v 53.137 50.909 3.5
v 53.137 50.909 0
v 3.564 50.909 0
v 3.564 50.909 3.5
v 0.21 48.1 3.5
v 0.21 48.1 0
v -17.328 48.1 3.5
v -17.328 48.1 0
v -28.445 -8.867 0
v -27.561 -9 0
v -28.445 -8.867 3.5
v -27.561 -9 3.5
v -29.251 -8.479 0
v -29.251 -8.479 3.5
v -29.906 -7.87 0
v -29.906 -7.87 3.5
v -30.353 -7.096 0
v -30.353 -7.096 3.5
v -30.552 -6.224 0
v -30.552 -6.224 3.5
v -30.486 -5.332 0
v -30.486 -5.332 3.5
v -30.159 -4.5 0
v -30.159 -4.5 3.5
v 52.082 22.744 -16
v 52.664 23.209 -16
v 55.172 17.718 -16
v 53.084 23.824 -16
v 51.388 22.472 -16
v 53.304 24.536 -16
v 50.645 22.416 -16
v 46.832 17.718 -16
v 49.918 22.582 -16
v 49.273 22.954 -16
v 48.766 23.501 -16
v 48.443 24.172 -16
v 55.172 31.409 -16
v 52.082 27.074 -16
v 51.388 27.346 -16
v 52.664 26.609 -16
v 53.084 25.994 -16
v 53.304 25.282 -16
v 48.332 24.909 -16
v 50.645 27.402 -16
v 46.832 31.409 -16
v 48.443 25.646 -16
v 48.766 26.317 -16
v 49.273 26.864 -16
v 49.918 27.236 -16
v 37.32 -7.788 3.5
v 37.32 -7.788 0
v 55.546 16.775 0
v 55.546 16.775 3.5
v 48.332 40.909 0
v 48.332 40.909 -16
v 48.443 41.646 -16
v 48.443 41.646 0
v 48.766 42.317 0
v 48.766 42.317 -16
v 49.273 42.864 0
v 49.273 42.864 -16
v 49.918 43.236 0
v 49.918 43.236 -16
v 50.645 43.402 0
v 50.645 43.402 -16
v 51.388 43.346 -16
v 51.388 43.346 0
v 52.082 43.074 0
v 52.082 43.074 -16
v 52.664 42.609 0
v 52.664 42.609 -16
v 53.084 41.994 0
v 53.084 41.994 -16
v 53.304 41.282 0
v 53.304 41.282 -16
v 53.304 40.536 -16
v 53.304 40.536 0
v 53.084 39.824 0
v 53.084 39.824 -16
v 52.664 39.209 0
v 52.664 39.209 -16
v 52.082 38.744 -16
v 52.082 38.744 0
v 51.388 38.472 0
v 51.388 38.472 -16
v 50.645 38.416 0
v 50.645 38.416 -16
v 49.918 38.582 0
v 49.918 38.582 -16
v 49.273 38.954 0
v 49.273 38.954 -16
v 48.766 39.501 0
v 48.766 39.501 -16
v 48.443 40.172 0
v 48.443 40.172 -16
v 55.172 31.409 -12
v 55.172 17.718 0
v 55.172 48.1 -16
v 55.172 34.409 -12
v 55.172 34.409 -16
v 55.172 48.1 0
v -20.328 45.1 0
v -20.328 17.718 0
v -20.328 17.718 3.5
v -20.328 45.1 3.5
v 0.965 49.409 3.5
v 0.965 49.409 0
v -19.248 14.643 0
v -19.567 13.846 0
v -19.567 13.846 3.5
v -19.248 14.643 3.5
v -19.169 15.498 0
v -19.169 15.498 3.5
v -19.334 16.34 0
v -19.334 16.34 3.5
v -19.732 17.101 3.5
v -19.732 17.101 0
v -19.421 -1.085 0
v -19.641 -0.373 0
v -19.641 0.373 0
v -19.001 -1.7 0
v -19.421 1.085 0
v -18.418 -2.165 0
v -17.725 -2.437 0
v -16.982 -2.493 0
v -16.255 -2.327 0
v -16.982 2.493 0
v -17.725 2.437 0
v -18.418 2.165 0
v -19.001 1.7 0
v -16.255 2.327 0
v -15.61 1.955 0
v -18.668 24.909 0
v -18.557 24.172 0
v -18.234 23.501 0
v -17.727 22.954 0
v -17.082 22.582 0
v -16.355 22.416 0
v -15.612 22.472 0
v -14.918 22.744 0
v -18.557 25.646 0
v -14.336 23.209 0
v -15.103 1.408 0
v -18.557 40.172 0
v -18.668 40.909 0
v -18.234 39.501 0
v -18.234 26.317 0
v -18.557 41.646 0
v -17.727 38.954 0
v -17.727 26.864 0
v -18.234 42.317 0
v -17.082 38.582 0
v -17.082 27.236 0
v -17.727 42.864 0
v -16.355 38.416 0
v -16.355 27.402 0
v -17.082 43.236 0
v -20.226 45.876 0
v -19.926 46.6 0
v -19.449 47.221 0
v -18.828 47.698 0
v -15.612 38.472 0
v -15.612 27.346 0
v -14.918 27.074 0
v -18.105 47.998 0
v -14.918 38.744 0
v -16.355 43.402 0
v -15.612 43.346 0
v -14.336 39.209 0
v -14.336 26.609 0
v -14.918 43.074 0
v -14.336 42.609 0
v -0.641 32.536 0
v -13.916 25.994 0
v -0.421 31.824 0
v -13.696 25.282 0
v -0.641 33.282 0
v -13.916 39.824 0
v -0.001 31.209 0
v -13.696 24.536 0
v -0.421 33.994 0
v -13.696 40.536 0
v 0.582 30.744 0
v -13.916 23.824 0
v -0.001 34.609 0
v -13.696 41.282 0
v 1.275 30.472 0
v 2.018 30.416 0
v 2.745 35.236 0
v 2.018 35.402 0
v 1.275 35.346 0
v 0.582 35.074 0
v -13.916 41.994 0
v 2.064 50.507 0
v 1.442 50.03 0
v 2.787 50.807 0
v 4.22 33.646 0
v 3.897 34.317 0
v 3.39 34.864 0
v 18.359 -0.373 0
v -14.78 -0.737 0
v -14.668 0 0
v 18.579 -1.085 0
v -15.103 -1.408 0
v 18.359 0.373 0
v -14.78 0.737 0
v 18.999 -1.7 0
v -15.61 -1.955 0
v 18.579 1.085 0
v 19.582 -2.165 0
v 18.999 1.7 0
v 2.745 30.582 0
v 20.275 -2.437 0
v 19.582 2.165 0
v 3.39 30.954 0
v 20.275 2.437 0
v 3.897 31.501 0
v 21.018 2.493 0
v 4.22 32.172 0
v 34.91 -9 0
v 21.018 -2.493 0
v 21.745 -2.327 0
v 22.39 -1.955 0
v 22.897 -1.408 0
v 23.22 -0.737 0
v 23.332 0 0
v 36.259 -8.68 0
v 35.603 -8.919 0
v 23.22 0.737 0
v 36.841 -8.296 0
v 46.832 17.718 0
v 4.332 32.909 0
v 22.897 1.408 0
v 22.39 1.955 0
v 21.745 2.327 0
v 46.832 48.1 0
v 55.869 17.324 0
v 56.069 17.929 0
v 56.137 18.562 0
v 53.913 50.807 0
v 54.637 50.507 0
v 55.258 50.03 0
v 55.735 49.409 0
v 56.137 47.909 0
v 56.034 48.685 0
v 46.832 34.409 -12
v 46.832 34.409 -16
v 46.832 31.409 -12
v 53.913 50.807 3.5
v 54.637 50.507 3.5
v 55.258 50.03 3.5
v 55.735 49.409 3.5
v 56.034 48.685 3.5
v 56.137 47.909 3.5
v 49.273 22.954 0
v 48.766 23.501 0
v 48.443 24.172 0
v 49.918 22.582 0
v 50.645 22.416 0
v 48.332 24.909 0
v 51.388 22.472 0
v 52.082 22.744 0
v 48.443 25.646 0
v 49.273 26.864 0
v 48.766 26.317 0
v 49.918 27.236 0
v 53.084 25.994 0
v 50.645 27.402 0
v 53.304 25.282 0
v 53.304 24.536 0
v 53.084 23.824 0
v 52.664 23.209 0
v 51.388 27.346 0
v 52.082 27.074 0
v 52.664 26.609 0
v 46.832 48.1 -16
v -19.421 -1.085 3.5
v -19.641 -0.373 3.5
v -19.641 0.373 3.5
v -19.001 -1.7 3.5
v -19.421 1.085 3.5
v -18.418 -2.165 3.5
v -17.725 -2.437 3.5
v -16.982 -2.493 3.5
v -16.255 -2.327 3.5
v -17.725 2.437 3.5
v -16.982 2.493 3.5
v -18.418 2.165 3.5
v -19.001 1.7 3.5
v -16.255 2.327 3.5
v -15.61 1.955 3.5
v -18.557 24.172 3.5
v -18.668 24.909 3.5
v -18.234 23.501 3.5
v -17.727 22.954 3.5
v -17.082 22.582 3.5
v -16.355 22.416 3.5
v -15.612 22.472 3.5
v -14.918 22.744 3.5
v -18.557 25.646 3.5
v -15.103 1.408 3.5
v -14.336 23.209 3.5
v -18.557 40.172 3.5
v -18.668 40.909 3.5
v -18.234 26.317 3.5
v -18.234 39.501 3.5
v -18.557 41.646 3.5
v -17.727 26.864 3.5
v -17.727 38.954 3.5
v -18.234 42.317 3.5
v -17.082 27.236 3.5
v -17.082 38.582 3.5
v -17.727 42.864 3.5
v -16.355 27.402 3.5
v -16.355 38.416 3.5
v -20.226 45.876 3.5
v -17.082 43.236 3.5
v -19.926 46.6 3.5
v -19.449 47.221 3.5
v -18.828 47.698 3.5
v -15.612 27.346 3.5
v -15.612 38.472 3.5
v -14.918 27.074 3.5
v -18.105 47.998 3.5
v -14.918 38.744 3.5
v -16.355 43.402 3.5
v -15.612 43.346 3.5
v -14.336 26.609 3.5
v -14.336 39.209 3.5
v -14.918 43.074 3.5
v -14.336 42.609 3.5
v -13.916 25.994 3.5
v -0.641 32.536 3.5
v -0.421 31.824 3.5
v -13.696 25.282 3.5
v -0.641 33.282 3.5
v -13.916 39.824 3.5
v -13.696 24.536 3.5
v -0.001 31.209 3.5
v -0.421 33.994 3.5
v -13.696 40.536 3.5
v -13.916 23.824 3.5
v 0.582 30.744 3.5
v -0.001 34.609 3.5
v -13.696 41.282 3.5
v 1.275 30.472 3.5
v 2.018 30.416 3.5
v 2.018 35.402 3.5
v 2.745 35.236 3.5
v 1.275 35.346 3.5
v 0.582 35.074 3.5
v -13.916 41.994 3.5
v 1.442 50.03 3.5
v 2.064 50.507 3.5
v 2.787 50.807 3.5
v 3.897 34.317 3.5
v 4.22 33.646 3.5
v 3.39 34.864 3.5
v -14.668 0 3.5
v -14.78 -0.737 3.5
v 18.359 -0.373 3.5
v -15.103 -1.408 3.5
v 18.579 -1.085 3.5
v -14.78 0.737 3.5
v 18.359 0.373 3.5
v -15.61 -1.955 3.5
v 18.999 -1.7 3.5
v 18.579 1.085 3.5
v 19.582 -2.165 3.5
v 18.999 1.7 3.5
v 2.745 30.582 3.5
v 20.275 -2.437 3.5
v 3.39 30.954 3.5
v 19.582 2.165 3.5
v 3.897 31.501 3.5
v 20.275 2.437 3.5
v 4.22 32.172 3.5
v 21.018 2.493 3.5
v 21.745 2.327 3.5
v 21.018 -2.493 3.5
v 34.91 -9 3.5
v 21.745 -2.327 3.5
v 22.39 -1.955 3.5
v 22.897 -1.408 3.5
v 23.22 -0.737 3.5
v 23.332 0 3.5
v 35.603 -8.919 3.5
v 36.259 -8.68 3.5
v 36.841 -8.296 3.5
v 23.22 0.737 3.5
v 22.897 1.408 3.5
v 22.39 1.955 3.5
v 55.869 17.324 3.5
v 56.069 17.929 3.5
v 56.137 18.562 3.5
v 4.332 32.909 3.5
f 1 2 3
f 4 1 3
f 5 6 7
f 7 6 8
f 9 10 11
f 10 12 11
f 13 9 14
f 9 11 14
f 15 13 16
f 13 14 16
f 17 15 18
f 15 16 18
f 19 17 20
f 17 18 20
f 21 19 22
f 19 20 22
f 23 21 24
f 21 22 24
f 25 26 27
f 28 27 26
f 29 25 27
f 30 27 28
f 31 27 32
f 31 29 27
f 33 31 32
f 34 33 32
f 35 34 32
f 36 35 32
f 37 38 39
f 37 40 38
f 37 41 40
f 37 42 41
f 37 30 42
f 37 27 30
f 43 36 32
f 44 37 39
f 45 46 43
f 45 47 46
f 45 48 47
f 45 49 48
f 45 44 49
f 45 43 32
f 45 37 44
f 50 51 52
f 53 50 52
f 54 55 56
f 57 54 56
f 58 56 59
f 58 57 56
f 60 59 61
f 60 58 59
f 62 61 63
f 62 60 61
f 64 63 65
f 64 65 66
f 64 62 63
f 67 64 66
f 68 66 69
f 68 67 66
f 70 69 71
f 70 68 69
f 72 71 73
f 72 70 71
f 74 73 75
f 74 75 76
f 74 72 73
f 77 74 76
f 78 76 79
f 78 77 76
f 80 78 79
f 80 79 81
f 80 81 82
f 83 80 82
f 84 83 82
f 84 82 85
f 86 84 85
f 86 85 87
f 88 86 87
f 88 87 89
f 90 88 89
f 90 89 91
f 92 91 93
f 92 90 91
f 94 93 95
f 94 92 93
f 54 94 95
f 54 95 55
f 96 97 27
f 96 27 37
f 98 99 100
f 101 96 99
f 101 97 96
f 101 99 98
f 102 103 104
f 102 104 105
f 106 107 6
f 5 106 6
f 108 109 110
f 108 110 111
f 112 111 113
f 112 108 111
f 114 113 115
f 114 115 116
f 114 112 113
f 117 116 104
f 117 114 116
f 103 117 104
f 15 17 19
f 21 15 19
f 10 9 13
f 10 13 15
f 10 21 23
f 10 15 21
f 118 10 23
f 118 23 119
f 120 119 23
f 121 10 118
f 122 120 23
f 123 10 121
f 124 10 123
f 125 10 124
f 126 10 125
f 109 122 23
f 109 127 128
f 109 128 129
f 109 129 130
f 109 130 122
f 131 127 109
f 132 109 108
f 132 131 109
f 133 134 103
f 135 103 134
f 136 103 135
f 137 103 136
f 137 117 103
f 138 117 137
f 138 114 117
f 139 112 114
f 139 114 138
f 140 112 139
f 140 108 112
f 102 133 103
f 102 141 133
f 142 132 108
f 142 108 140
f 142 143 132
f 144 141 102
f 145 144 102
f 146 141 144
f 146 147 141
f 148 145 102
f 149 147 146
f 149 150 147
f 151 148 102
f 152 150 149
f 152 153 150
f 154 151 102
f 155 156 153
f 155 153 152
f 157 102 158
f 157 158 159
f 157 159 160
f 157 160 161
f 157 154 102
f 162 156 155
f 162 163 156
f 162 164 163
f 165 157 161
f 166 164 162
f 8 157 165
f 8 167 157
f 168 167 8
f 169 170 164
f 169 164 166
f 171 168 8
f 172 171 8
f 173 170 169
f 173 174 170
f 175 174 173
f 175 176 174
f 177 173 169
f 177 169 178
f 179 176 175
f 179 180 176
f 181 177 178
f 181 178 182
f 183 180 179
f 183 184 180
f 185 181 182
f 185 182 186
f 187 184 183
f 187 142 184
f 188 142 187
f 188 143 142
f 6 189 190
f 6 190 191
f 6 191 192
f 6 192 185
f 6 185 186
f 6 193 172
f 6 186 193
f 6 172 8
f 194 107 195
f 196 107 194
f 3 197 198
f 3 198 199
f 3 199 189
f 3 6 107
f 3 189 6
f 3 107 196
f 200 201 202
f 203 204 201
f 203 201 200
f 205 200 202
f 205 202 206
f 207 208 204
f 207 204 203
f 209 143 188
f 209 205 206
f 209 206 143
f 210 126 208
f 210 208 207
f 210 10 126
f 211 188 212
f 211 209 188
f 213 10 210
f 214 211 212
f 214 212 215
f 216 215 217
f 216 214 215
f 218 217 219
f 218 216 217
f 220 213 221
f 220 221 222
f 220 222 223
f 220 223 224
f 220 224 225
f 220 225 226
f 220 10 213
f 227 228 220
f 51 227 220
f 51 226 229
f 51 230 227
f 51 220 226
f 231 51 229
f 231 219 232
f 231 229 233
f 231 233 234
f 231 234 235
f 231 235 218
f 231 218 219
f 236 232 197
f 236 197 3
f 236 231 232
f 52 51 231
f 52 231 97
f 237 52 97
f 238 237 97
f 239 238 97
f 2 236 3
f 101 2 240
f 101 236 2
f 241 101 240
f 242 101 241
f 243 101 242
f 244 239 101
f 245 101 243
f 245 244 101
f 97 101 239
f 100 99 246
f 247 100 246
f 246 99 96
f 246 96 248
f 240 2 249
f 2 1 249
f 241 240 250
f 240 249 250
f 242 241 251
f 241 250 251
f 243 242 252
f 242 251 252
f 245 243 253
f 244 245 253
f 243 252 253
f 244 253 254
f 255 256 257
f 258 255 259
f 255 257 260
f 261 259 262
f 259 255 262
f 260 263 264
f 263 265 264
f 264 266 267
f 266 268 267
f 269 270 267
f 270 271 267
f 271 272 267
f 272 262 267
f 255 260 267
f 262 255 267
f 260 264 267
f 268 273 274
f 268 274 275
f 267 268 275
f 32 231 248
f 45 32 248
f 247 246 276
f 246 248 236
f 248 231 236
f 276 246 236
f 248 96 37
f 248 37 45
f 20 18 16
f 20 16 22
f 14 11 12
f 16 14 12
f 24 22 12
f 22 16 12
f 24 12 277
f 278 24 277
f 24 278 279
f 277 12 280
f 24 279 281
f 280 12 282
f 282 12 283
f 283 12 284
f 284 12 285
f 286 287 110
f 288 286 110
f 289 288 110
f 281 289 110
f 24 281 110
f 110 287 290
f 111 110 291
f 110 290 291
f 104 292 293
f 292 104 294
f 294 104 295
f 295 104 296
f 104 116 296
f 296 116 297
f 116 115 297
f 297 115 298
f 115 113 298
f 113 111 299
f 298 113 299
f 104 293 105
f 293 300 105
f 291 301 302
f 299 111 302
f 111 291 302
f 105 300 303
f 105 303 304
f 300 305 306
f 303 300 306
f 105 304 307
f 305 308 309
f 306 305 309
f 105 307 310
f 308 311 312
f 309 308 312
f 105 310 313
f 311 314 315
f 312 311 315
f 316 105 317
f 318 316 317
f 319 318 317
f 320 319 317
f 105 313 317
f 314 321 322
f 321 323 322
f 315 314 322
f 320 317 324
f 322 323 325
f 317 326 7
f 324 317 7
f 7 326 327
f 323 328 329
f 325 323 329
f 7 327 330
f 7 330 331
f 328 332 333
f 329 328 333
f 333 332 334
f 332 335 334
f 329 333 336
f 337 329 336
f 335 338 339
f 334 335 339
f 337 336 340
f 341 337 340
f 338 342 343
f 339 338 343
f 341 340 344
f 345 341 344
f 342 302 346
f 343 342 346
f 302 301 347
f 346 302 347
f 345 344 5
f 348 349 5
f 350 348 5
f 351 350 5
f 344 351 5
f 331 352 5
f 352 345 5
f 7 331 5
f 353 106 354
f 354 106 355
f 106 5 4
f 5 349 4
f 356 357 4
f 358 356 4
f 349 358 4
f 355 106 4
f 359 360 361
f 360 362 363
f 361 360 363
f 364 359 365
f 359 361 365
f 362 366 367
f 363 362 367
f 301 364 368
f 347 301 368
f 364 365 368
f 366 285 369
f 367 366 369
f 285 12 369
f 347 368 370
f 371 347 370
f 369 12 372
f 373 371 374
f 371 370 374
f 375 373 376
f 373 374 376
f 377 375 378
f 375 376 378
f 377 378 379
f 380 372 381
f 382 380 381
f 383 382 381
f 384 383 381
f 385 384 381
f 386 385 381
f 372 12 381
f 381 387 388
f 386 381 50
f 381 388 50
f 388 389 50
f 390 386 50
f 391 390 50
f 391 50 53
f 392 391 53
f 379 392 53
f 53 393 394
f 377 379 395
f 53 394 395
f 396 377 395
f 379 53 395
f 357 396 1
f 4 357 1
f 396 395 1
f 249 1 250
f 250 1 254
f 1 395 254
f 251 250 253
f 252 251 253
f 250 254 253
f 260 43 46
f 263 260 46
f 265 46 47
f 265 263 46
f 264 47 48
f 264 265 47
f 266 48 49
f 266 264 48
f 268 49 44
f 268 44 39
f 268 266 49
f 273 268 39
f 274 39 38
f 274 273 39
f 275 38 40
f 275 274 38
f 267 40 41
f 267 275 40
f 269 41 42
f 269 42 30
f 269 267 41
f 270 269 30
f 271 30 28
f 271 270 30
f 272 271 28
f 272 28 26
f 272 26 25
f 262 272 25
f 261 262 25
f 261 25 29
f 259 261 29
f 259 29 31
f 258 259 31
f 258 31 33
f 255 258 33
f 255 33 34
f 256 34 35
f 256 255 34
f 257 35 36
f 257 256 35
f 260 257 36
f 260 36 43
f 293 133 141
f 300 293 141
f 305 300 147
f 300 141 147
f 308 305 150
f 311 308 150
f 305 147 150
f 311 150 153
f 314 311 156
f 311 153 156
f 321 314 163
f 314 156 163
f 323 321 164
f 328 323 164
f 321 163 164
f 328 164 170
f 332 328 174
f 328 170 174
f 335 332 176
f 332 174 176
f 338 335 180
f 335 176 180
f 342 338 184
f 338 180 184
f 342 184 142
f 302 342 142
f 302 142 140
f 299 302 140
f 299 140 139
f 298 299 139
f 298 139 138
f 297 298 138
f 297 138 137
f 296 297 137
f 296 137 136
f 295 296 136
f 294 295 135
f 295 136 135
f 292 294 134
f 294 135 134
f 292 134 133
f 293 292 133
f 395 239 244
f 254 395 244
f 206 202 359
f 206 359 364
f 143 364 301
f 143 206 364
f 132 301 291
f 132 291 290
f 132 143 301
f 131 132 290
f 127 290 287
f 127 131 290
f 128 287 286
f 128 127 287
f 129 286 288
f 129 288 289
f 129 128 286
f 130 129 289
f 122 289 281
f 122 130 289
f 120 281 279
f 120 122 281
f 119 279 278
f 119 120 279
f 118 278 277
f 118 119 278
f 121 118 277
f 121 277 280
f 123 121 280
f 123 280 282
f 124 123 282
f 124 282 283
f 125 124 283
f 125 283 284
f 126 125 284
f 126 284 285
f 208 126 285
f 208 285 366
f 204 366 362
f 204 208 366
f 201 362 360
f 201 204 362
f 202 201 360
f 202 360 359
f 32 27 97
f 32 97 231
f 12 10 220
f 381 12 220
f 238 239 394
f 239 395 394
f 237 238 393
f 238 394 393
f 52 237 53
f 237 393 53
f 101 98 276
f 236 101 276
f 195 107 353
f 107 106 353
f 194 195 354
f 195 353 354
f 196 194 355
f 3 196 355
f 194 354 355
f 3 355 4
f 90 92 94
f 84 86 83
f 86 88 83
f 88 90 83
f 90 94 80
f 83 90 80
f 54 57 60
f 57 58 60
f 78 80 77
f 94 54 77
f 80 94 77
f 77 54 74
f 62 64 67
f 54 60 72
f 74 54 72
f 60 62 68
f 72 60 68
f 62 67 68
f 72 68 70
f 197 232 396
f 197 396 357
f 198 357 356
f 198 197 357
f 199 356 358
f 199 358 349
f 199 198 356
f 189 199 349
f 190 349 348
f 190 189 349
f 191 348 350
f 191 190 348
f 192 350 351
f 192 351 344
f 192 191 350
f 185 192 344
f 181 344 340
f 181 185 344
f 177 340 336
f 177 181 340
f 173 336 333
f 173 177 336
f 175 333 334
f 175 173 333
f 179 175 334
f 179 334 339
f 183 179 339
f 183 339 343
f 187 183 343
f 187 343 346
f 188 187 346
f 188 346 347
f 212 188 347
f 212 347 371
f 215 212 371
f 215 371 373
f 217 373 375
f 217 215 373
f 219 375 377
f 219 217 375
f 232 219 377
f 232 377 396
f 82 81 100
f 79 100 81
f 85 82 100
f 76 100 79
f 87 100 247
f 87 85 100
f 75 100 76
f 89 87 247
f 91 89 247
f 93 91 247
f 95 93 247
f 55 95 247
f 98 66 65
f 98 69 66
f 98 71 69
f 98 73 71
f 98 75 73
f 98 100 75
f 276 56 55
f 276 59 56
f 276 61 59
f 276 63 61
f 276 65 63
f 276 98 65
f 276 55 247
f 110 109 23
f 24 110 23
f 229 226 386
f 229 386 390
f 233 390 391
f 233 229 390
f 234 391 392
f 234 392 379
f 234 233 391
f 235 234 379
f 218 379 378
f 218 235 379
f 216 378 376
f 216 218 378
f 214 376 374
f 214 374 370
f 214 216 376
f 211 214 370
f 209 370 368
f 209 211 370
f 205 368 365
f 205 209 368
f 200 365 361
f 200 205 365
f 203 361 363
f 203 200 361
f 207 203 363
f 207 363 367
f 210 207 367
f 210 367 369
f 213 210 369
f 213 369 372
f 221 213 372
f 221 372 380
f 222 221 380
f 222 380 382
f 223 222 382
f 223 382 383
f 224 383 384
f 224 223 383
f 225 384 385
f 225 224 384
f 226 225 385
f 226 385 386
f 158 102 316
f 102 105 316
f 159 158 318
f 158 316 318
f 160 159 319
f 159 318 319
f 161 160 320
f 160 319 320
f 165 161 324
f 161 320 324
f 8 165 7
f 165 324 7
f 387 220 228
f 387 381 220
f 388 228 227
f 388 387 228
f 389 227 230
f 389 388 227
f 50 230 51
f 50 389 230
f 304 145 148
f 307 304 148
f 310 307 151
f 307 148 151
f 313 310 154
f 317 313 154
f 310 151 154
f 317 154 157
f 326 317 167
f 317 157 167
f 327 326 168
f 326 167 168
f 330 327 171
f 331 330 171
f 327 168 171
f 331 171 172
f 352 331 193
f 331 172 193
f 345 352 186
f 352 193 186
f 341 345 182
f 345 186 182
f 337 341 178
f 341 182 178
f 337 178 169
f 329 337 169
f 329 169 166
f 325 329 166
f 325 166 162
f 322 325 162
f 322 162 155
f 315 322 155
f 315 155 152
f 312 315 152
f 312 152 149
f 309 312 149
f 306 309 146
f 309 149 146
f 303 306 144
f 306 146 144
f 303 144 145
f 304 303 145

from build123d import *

# Parameters (mm, degrees)
SKETCH1_R           = 2.5
BOSS_EXTRUDE1_DEPTH = 3.5
FILLET1_R           = 3
SKETCH2_W           = 75.5
SKETCH2_H           = 30.382012963
SKETCH2_R           = 4.125
SKETCH2_R_2         = 2.5
BOSS_EXTRUDE2_DEPTH = 3.5
SKETCH2_4_W         = 8.340351234
SKETCH2_4_H         = 13.691006481
SKETCH2_4_R         = 2.5
SKETCH2_4_H_2       = 13.691006482
BOSS_EXTRUDE3_DEPTH = 16
FILLET2_R           = 3
FILLET3_R           = 3
SKETCH2_7_W         = 8.340351234
SKETCH2_7_H         = 3
BOSS_EXTRUDE5_DEPTH = 12


with BuildPart() as part:
    # Sketch1 → Boss-Extrude1 (new body)
    with BuildSketch(Plane.XY):
        Polygon((-32.756938656, -9), (36.41997588, -9), (56.136580269, 17.570938838), (56.136580269, 50.908965344), (1.831518612, 50.908965344), align=None)
        with Locations((-17.168481388, 0)):
            Circle(SKETCH1_R, mode=Mode.SUBTRACT)
        with Locations((20.831518612, 0)):
            Circle(SKETCH1_R, mode=Mode.SUBTRACT)
        with Locations((1.831518612, 32.908965344)):
            Circle(SKETCH1_R, mode=Mode.SUBTRACT)
    extrude(amount=BOSS_EXTRUDE1_DEPTH)

    # Fillet1
    fillet1_edges = [part.edges().sort_by_distance(p)[0] for p in [
        (36.41997588, -9, 1.75),
        (-32.756938656, -9, 1.75),
        (1.831518612, 50.908965344, 1.75),
    ]]
    fillet(fillet1_edges, radius=FILLET1_R)

    # Sketch2 → Boss-Extrude2 (add)
    with BuildSketch(Plane(origin=(0, 0, 0), x_dir=(-1, 0, 0), z_dir=(0, 0, -1))):
        with Locations((-17.421869846, 32.908965344)):
            Rectangle(SKETCH2_W, SKETCH2_H)
        with Locations((-1.831518612, 32.908965344)):
            Circle(SKETCH2_R, mode=Mode.SUBTRACT)
        with Locations((16.168481388, 40.908965344)):
            Circle(SKETCH2_R_2, mode=Mode.SUBTRACT)
        with Locations((16.168481388, 24.908965344)):
            Circle(SKETCH2_R_2, mode=Mode.SUBTRACT)
        with Locations((-50.831518612, 24.908965344)):
            Circle(SKETCH2_R_2, mode=Mode.SUBTRACT)
        with Locations((-50.831518612, 40.908965344)):
            Circle(SKETCH2_R_2, mode=Mode.SUBTRACT)
    extrude(amount=-BOSS_EXTRUDE2_DEPTH)

    # Sketch2<4> → Boss-Extrude3 (add)
    # profile 1 of 2: a face of its own
    with BuildSketch(Plane(origin=(0, 0, 0), x_dir=(-1, 0, 0), z_dir=(0, 0, -1))):
        with Locations((-51.001694229, 41.254468585)):
            Rectangle(SKETCH2_4_W, SKETCH2_4_H)
        with Locations((-50.831518612, 40.908965344)):
            Circle(SKETCH2_4_R, mode=Mode.SUBTRACT)
    # profile 2 of 2: a face of its own
    with BuildSketch(Plane(origin=(0, 0, 0), x_dir=(-1, 0, 0), z_dir=(0, 0, -1))):
        with Locations((-51.001694229, 24.563462103)):
            Rectangle(SKETCH2_4_W, SKETCH2_4_H_2)
        with Locations((-50.831518612, 24.908965344)):
            Circle(SKETCH2_4_R, mode=Mode.SUBTRACT)
    extrude(amount=BOSS_EXTRUDE3_DEPTH)

    # Fillet2
    # the kernel refuses this fillet: 3 mm, written as the material it adds along each edge
    with BuildSketch(Plane(origin=(-17.331317914, 17.717958862, 0), x_dir=(-0.4999999999999997, -0.8660254037844388, 0), z_dir=(0, 0, 1))) as fillet2_piece_1:
        with BuildLine():
            CenterArc((4.470985889, -3), FILLET2_R, 90, 82.247461928)
            Line((1.49840612, -2.59531553), (1.438954525, -2.587221841))
            ThreePointArc((1.438954525, -2.587221841), (0.697241536, -1.327657765), (-0.051961524, -0.03))
            Line((-0.051961524, -0.03), (0, 0.06))
            Line((0, 0.06), (4.470985889, 0.06))
            Line((4.470985889, 0.06), (4.470985889, 0))
        make_face()
    extrude(amount=3.5)

    # Fillet3
    fillet3_edges = [part.edges().sort_by_distance(p)[0] for p in [
        (-20.328130154, 48.099971825, 1.75),
        (56.136580269, 50.908965344, 1.75),
        (56.136580269, 17.570938838, 1.75),
    ]]
    fillet(fillet3_edges, radius=FILLET3_R)

    # Sketch2<7> → Boss-Extrude5 (add)
    with BuildSketch(Plane(origin=(0, 0, 0), x_dir=(-1, 0, 0), z_dir=(0, 0, -1))):
        with Locations((-51.001694229, 32.908965344)):
            Rectangle(SKETCH2_7_W, SKETCH2_7_H)
    extrude(amount=BOSS_EXTRUDE5_DEPTH)


solid = part.part
